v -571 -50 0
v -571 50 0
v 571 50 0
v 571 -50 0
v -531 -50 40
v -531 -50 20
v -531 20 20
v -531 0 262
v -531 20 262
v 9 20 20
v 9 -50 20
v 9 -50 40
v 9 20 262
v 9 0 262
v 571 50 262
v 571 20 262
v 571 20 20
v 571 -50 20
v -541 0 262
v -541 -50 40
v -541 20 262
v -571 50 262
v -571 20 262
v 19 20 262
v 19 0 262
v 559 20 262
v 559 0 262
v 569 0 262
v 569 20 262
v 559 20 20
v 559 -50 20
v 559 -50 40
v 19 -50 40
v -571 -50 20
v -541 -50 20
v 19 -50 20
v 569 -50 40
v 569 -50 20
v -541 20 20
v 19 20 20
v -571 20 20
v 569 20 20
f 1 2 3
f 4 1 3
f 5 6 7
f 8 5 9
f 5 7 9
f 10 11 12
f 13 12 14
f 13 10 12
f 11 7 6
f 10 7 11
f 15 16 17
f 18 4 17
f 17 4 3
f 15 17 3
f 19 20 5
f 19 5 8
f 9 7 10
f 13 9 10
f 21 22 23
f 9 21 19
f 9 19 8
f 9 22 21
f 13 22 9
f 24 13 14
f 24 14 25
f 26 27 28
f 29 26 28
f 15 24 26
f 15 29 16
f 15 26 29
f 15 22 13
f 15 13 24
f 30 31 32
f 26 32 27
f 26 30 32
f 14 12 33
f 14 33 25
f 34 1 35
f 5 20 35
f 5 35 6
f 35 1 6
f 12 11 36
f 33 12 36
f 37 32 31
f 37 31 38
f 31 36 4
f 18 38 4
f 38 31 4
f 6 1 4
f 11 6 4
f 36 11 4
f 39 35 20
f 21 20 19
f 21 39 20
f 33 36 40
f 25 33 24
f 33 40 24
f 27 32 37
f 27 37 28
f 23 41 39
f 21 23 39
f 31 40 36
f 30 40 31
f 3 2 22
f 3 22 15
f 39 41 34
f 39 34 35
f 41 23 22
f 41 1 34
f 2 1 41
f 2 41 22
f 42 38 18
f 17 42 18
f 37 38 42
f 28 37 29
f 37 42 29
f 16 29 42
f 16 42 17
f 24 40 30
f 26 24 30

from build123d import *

# Parameters (mm, degrees)
SKETCH_1_W             = 1142
SKETCH_1_H             = 100
EXTRUDE_1_DEPTH        = 20
SKETCH_2_W             = 1142
SKETCH_2_H             = 30
EXTRUDE_2_DEPTH        = 242
EXTRUDE_START          = -30
EXTRUDE_3_DEPTH        = 10
PATTERN_LINEAR_1_COUNT = 3
PATTERN_LINEAR_1_PITCH = 550


with BuildPart() as part:
    # 草图1 → 凸台-拉伸1 (new body)
    with BuildSketch(Plane.XY):
        Rectangle(SKETCH_1_W, SKETCH_1_H)
    extrude(amount=EXTRUDE_1_DEPTH)



with BuildPart() as body_2:
    # 草图2 → 凸台-拉伸2 (new body)
    with BuildSketch(Plane.XY.offset(20)):
        with Locations((0, 35)):
            Rectangle(SKETCH_2_W, SKETCH_2_H)
    extrude(amount=EXTRUDE_2_DEPTH)


with BuildPart() as part_1:
    add(part.part)

    add(body_2.part)  # 凸台-拉伸3 merges body 2
    # 草图3 → 凸台-拉伸3 (add)
    with BuildSketch(Plane.ZY.offset(571).offset(EXTRUDE_START)):
        Polygon((262, 20), (20, 20), (20, -50), (40, -50), (262, 0), align=None)
    extrude_3 = extrude(amount=-EXTRUDE_3_DEPTH)

    # 阵列(线性)1: 凸台-拉伸3 ×3
    with Locations(*[(i * PATTERN_LINEAR_1_PITCH, 0, 0) for i in range(1, PATTERN_LINEAR_1_COUNT)]):
        add(extrude_3)


solid = part_1.part
